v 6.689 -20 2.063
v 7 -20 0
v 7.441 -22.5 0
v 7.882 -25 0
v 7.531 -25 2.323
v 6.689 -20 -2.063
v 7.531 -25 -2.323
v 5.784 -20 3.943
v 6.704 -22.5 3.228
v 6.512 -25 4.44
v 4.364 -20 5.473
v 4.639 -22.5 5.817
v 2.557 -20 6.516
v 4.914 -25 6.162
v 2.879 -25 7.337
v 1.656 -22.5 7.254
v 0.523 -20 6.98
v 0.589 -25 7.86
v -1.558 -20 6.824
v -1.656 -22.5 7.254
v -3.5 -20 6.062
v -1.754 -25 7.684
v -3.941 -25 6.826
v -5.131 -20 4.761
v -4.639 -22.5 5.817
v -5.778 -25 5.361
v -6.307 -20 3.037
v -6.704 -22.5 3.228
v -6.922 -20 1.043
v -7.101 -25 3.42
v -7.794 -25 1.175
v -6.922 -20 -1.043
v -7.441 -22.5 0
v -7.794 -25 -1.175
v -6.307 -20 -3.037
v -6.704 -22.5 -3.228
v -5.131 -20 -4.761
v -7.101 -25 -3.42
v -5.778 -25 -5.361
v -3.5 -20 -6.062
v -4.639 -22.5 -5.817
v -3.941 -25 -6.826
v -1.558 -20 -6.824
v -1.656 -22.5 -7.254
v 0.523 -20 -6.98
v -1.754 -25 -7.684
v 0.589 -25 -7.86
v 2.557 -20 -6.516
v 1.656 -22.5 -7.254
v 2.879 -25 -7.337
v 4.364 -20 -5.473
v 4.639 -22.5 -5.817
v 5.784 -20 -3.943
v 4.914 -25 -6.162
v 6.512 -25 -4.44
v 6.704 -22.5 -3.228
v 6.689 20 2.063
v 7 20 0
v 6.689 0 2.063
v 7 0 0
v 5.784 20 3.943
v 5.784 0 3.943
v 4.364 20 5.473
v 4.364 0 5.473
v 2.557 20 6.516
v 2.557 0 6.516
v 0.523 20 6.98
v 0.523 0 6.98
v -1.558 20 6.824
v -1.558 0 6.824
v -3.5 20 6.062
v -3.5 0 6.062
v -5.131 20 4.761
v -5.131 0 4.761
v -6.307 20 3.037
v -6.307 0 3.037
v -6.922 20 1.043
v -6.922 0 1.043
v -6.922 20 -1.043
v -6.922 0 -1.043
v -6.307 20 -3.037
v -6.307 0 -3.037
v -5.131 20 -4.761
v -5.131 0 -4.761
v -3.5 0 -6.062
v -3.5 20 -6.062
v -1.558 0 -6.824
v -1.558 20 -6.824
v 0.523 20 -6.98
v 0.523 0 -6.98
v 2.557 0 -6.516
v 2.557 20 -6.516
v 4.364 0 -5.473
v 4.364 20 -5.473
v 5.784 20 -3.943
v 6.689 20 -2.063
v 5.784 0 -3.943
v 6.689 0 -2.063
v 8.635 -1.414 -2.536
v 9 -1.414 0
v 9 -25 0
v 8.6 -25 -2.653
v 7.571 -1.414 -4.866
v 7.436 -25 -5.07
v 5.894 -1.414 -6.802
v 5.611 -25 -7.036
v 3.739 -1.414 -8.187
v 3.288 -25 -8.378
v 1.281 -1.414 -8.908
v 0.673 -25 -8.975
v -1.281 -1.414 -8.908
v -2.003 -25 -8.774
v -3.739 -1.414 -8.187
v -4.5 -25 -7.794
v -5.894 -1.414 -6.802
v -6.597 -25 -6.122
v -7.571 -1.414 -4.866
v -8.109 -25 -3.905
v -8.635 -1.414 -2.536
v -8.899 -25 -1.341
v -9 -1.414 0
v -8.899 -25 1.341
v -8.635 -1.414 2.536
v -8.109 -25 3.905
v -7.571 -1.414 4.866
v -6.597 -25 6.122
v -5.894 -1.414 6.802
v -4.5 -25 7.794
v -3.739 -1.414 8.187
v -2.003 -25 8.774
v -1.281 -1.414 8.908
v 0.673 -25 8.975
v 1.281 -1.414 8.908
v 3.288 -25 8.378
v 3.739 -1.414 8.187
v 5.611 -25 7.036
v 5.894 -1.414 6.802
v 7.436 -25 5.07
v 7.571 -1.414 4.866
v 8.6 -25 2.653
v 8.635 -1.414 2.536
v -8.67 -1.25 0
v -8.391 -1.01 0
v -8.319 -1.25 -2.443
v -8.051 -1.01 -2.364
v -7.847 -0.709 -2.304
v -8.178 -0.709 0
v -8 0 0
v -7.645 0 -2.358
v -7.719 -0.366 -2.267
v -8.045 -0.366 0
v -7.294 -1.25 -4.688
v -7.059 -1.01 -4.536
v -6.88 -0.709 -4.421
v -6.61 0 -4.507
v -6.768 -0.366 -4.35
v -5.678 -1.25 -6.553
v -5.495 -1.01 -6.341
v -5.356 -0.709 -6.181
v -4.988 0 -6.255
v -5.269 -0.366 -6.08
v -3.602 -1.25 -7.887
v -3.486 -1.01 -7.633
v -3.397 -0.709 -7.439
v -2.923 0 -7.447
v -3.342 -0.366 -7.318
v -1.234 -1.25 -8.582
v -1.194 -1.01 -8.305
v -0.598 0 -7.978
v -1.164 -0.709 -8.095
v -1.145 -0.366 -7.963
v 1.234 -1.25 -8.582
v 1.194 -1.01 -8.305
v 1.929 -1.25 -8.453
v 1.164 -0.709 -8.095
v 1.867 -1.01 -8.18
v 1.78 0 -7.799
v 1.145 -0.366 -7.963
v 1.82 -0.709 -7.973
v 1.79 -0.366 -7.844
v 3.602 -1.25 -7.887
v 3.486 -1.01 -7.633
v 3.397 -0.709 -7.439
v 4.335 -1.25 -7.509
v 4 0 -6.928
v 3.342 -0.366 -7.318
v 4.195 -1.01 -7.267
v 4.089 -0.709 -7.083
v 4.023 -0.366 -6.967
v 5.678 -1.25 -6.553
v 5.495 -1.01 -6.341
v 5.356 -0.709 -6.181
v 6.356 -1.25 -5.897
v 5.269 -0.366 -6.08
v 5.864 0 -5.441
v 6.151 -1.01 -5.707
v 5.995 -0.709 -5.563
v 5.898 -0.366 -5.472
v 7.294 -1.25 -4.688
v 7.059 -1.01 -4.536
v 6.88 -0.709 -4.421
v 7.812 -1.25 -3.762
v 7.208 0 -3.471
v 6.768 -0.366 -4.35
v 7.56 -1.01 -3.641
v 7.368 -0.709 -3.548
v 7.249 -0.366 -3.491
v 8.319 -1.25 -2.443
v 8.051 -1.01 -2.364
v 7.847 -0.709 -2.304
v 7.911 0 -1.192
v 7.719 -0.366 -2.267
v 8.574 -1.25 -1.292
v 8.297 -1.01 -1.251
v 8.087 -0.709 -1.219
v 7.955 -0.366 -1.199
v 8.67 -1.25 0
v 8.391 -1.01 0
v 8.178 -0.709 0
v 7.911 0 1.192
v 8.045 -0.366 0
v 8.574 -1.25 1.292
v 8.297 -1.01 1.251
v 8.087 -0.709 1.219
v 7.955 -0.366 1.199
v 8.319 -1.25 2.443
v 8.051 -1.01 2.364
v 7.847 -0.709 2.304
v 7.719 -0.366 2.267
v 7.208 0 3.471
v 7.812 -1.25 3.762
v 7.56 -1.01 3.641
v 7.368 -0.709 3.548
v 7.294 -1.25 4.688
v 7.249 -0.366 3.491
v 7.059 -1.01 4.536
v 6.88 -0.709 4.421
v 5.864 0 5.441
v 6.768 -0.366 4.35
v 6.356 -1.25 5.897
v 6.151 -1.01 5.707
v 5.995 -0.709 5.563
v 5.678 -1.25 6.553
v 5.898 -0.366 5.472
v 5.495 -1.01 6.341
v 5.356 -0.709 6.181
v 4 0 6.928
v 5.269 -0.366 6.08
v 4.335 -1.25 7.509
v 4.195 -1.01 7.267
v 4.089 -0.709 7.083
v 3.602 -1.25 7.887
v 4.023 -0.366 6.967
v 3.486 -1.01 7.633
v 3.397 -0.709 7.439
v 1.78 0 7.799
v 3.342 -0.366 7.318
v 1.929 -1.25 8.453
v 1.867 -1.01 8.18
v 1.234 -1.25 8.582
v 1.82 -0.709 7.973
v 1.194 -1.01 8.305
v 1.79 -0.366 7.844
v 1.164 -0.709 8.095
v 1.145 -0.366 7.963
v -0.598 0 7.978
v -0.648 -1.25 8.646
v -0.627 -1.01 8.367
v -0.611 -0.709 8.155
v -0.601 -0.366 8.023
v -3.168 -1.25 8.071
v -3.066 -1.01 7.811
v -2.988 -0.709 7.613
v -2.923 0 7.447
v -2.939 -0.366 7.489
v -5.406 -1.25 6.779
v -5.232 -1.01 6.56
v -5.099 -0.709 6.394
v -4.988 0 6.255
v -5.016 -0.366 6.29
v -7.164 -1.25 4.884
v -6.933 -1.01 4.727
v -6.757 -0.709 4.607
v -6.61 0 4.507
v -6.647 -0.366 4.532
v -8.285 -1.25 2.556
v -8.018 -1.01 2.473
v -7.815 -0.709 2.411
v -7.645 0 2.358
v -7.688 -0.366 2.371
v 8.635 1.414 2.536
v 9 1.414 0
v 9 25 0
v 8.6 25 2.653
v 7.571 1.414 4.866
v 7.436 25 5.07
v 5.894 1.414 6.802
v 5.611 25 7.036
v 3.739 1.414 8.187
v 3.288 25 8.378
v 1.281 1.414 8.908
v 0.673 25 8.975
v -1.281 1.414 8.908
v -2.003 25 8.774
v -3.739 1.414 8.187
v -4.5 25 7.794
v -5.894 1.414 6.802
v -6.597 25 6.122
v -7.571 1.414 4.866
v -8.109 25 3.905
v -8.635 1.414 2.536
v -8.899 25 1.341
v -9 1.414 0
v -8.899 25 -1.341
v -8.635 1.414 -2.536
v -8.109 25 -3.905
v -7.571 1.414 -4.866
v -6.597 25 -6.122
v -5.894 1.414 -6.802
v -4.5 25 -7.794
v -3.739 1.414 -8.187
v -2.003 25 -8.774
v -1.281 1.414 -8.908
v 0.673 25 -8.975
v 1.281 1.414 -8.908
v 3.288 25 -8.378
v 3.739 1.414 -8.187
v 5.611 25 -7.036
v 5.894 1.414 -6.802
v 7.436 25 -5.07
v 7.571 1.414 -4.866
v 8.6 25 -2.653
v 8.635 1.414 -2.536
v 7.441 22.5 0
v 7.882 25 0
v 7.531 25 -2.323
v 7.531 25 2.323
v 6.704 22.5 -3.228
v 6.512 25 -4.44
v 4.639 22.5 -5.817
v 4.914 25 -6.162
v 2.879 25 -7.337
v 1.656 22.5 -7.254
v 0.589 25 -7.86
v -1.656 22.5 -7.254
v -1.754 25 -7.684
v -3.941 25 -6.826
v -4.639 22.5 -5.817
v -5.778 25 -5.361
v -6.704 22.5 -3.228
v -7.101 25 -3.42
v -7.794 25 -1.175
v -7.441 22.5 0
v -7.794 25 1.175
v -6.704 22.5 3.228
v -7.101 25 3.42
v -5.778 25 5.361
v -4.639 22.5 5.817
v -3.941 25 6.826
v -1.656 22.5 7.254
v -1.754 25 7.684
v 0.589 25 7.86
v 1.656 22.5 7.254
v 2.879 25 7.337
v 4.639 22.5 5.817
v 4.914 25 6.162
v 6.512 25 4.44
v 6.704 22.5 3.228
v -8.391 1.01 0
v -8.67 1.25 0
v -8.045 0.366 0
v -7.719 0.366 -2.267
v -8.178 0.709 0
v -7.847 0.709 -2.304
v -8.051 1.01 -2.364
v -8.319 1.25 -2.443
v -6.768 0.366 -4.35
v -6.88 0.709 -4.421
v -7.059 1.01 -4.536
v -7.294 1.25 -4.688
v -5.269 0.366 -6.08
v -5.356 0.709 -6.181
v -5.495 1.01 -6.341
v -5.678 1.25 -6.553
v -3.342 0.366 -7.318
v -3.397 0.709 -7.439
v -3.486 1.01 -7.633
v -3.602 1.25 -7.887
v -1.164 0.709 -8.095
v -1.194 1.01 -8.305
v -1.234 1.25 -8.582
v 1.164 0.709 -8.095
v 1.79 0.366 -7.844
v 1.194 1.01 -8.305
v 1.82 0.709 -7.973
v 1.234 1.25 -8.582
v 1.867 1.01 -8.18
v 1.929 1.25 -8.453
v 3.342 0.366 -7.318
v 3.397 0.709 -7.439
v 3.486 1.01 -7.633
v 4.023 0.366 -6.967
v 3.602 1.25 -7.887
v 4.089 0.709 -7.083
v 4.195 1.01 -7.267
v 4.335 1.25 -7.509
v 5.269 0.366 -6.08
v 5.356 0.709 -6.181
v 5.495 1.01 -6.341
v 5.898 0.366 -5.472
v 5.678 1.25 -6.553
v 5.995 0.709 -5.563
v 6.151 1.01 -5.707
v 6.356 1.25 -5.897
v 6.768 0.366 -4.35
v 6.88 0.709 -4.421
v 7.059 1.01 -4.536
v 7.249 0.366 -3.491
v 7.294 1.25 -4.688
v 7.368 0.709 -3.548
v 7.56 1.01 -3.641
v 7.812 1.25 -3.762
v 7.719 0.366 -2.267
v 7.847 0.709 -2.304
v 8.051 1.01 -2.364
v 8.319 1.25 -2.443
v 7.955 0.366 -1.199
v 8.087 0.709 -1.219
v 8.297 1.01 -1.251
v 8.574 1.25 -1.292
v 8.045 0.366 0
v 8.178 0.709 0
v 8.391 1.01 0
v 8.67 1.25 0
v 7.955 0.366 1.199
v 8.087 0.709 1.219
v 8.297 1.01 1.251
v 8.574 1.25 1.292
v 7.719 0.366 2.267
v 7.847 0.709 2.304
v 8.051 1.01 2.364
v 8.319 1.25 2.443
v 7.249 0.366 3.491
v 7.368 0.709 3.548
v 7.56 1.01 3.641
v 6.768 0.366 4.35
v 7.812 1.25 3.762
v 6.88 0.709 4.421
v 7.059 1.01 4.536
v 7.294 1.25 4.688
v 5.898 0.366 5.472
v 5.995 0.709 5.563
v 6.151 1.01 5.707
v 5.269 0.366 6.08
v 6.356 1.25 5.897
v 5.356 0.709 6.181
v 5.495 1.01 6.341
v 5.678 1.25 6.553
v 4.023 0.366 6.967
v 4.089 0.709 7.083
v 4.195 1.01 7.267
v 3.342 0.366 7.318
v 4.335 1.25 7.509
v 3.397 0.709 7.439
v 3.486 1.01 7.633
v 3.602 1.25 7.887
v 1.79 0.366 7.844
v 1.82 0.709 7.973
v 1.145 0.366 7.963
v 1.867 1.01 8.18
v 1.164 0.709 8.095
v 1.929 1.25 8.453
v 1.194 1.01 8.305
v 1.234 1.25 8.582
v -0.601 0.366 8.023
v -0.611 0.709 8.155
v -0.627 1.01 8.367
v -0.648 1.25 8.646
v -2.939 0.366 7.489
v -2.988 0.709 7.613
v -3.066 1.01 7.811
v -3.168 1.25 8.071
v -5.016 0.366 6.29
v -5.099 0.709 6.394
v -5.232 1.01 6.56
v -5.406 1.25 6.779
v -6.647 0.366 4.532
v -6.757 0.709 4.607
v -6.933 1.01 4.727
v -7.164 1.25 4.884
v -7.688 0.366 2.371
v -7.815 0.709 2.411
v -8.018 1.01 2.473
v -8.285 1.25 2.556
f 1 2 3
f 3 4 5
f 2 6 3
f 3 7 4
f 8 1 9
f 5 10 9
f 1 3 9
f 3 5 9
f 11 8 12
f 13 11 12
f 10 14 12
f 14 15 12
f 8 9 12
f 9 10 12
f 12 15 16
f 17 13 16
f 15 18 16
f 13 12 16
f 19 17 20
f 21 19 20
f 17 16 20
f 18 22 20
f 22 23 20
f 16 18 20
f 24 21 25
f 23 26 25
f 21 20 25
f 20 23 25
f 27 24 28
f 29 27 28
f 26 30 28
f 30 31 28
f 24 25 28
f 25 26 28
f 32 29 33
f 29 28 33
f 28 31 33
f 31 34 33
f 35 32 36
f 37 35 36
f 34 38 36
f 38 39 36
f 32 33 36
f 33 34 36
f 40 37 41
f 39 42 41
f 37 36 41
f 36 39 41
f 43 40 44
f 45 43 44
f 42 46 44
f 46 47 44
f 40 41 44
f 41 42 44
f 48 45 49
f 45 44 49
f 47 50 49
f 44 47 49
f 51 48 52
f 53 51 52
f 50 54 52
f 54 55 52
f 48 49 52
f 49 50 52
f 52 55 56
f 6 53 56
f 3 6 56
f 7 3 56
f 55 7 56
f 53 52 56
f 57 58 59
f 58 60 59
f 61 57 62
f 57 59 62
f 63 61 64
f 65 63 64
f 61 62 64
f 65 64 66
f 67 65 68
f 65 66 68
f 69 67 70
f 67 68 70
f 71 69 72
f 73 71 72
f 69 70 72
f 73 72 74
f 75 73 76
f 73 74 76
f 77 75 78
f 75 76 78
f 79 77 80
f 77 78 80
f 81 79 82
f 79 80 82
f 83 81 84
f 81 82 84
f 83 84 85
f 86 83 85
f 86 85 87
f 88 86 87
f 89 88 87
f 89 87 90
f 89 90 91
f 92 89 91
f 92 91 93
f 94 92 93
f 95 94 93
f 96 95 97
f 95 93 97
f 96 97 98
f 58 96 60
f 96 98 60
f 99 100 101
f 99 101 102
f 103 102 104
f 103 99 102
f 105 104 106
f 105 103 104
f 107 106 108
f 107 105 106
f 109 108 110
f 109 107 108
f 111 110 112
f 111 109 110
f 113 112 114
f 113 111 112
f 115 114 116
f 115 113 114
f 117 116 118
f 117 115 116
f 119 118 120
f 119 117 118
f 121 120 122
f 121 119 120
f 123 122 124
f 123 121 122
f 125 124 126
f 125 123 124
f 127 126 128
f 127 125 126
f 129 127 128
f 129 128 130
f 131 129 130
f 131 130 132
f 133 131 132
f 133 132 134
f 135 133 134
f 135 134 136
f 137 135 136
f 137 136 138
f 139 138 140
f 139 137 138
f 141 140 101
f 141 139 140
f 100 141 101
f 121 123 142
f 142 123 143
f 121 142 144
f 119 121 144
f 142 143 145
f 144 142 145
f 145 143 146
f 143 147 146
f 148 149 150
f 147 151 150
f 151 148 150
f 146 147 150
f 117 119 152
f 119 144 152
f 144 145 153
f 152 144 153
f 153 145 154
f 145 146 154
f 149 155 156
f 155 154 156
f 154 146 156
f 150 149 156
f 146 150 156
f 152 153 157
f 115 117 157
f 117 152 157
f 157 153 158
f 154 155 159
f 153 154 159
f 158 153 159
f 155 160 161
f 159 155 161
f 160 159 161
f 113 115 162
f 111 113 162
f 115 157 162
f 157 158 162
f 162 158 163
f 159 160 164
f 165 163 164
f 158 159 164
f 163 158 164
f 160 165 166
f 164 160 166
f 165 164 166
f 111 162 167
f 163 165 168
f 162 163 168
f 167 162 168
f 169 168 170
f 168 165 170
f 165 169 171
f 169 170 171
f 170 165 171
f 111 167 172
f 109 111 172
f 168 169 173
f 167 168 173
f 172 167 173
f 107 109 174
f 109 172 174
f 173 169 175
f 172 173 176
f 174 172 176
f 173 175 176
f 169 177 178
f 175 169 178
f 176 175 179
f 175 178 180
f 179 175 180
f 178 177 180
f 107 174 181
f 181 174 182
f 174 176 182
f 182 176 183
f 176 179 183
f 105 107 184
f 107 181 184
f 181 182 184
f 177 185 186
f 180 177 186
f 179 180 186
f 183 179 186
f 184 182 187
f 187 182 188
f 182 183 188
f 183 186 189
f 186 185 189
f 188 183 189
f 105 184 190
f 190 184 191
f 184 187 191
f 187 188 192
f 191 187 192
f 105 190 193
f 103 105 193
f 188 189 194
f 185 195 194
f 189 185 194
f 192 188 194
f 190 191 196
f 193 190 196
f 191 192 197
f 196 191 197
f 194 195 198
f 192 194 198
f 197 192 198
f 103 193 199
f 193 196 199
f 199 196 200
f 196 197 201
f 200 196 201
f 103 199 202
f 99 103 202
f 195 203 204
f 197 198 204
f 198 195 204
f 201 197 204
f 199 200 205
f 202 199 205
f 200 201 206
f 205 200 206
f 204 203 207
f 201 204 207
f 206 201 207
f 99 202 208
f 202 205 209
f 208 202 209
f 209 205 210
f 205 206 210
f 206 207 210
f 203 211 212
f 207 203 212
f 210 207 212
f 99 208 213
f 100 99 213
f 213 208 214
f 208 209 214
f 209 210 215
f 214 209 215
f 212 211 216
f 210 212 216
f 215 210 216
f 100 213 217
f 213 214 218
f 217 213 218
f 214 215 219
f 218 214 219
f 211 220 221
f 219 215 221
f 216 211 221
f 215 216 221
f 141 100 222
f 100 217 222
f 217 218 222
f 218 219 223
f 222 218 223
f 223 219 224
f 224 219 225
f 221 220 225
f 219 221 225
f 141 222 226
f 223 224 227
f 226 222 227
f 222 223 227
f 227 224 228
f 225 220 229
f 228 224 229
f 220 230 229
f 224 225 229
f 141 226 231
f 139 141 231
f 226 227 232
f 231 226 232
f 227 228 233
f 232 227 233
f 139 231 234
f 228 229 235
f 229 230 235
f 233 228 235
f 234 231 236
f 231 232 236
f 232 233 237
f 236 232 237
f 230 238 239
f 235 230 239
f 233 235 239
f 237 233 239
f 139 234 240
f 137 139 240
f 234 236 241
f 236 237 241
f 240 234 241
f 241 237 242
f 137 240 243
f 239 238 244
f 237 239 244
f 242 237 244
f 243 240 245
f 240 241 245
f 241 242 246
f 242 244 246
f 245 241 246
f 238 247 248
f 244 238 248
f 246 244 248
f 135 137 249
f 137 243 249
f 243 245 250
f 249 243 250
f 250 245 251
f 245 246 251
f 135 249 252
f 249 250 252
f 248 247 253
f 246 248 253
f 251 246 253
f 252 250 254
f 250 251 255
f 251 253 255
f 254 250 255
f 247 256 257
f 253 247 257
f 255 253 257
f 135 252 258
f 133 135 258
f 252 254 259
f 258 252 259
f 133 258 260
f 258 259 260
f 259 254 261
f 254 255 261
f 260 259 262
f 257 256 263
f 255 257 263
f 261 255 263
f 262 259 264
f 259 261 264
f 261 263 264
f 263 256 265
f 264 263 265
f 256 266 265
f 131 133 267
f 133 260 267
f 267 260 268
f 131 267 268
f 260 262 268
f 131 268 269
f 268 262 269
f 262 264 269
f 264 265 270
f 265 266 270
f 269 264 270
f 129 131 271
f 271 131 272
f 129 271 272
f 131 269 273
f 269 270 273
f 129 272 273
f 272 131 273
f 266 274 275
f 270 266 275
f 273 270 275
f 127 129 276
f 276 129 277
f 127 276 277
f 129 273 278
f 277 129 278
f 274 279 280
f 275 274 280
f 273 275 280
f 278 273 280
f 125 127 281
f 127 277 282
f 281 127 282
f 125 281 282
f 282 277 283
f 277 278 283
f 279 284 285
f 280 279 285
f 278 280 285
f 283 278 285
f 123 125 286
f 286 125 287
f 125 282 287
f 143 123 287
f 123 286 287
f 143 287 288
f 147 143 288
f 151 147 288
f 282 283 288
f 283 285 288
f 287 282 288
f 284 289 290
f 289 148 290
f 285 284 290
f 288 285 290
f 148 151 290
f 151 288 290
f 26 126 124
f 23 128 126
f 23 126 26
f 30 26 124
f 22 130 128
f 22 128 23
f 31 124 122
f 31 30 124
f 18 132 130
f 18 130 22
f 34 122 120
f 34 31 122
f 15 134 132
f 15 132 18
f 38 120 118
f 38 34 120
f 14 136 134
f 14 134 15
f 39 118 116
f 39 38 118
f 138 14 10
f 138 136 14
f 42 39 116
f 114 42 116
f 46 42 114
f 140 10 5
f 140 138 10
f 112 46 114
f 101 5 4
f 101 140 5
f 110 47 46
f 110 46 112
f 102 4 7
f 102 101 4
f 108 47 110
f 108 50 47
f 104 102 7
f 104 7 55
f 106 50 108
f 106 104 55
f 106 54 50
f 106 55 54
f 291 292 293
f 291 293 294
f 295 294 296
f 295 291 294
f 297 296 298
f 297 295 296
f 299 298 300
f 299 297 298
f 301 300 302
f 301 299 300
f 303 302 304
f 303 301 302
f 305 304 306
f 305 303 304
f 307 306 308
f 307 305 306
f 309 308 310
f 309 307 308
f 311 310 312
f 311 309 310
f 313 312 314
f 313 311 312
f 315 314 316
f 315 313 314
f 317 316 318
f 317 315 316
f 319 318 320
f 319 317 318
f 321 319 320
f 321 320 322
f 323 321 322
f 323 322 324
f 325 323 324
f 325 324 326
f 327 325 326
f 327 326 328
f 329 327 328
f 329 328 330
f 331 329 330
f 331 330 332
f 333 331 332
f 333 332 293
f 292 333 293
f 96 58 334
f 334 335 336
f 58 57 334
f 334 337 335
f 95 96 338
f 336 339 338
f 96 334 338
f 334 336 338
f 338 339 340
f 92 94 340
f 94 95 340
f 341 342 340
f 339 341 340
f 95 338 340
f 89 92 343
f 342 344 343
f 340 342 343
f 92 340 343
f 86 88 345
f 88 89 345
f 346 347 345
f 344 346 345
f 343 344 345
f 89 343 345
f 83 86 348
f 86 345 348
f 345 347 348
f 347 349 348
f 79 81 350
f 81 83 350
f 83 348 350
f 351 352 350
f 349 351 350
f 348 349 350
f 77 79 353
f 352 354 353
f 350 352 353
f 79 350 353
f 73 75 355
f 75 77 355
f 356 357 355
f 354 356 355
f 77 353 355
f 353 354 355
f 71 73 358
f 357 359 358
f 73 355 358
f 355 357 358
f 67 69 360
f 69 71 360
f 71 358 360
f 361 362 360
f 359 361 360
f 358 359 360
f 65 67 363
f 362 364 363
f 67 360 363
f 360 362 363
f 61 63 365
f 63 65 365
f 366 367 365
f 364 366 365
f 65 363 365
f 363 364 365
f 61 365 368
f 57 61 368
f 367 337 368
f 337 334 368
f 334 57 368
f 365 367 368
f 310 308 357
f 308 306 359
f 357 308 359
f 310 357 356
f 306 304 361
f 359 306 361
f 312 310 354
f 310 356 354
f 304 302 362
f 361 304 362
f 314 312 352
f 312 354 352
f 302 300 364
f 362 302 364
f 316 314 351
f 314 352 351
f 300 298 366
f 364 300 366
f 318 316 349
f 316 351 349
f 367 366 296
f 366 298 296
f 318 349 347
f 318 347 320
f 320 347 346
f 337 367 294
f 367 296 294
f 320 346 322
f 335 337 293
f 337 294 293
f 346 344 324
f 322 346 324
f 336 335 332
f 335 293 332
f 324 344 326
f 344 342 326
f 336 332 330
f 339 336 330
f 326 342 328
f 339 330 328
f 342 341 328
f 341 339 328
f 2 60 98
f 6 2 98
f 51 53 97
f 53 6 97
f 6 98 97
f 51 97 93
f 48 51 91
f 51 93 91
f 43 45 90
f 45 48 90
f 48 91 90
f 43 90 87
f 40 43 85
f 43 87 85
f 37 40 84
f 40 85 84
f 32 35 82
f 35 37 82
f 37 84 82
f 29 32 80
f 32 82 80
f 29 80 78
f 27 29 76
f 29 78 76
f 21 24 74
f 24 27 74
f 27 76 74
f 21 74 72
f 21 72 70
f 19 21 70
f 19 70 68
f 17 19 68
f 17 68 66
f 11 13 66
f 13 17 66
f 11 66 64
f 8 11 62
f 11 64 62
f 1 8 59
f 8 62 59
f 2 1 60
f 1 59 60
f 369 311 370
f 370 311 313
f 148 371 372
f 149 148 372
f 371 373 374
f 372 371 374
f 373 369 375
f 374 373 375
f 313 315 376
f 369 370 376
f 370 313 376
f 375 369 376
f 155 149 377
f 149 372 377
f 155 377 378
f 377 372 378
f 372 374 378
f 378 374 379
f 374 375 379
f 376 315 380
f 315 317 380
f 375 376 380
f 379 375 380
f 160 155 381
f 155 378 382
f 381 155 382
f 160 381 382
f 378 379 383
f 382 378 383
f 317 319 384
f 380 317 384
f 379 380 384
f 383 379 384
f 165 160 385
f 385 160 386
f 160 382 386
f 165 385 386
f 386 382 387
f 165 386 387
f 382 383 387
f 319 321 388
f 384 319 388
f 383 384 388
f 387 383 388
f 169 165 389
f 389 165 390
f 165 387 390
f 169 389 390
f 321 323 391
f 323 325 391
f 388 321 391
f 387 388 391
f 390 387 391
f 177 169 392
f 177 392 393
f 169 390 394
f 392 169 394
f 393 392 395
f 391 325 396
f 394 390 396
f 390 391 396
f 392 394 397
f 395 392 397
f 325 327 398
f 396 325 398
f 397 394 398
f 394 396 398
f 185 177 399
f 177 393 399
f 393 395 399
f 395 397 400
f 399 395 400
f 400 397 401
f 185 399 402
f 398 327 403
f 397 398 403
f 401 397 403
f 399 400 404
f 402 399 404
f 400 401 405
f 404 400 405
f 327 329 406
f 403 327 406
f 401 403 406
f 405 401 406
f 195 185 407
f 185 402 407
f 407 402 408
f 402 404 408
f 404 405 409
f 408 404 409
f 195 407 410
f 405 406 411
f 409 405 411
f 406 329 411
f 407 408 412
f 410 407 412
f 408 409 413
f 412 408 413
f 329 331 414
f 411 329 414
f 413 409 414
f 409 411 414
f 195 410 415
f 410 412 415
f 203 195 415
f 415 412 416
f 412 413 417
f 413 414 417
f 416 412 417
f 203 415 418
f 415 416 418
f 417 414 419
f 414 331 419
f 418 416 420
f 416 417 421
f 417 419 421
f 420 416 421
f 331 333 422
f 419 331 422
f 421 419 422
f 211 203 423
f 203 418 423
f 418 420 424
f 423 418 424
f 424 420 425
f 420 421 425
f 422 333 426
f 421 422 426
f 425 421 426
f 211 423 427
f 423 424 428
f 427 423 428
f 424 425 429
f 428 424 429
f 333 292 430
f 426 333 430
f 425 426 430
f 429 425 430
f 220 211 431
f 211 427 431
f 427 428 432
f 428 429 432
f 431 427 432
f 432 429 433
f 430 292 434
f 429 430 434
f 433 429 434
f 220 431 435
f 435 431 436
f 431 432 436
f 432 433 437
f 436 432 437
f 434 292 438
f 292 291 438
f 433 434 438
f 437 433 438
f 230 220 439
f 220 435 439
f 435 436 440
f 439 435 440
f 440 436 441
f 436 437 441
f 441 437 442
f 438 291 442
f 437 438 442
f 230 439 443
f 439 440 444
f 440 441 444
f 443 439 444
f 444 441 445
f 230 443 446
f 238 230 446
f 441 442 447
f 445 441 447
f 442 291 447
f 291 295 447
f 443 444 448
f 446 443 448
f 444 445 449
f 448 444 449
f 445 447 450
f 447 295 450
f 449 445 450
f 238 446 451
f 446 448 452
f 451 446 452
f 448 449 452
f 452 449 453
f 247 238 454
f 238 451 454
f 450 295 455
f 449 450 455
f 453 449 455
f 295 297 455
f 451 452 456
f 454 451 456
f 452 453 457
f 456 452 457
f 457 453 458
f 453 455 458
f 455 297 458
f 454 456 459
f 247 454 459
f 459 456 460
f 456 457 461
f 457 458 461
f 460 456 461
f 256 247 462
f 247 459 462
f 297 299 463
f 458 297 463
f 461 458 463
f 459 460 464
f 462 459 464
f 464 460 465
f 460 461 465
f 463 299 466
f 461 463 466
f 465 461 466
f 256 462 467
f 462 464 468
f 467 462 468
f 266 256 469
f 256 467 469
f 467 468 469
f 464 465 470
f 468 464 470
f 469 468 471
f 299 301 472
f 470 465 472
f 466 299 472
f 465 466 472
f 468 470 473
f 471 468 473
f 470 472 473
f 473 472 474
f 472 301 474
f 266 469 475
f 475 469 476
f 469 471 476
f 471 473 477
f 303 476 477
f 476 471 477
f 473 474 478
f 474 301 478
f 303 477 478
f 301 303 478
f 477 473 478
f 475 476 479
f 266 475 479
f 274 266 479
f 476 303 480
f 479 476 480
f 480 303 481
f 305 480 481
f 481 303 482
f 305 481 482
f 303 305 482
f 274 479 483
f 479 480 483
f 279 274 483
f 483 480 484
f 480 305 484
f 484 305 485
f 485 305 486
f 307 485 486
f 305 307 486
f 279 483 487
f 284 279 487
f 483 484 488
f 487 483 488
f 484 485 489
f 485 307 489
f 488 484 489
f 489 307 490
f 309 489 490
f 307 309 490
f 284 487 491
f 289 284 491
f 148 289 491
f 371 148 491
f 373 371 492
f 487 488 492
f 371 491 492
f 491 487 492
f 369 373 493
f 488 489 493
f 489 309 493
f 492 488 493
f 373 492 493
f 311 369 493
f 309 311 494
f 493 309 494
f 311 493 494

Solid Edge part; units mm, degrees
sketch "Sketch1" plane through (0, 0, 0) normal (0, -1, 0) x (1, 0, 0)
  circle A0 centre (0, 0) radius 9
  circle A1 centre (0, 0) radius 7
extrude "Protrusion1" add sketch "Sketch1" along normal mid plane 50
sketch "Sketch2" plane through (0, 0, 0) normal (0, 0, 1) x (1, 0, 0)
  circle A0 centre (-9.5, 0) radius 1.5
  dimension "D1" = 9.5
revolve "RevolvedCutout1" cut sketch "Sketch2" angle 360 about axis through (0, 54, 0) along (0, -1, 0)
chamfer "Chanfro_1" distance 5 angle 10 2 edges at (-7, -25, 0) (-7, 25, 0) measured on face at (3.8737, -20.5833, 5.8304) measured on face at (3.8737, 20.5833, 5.8304)
